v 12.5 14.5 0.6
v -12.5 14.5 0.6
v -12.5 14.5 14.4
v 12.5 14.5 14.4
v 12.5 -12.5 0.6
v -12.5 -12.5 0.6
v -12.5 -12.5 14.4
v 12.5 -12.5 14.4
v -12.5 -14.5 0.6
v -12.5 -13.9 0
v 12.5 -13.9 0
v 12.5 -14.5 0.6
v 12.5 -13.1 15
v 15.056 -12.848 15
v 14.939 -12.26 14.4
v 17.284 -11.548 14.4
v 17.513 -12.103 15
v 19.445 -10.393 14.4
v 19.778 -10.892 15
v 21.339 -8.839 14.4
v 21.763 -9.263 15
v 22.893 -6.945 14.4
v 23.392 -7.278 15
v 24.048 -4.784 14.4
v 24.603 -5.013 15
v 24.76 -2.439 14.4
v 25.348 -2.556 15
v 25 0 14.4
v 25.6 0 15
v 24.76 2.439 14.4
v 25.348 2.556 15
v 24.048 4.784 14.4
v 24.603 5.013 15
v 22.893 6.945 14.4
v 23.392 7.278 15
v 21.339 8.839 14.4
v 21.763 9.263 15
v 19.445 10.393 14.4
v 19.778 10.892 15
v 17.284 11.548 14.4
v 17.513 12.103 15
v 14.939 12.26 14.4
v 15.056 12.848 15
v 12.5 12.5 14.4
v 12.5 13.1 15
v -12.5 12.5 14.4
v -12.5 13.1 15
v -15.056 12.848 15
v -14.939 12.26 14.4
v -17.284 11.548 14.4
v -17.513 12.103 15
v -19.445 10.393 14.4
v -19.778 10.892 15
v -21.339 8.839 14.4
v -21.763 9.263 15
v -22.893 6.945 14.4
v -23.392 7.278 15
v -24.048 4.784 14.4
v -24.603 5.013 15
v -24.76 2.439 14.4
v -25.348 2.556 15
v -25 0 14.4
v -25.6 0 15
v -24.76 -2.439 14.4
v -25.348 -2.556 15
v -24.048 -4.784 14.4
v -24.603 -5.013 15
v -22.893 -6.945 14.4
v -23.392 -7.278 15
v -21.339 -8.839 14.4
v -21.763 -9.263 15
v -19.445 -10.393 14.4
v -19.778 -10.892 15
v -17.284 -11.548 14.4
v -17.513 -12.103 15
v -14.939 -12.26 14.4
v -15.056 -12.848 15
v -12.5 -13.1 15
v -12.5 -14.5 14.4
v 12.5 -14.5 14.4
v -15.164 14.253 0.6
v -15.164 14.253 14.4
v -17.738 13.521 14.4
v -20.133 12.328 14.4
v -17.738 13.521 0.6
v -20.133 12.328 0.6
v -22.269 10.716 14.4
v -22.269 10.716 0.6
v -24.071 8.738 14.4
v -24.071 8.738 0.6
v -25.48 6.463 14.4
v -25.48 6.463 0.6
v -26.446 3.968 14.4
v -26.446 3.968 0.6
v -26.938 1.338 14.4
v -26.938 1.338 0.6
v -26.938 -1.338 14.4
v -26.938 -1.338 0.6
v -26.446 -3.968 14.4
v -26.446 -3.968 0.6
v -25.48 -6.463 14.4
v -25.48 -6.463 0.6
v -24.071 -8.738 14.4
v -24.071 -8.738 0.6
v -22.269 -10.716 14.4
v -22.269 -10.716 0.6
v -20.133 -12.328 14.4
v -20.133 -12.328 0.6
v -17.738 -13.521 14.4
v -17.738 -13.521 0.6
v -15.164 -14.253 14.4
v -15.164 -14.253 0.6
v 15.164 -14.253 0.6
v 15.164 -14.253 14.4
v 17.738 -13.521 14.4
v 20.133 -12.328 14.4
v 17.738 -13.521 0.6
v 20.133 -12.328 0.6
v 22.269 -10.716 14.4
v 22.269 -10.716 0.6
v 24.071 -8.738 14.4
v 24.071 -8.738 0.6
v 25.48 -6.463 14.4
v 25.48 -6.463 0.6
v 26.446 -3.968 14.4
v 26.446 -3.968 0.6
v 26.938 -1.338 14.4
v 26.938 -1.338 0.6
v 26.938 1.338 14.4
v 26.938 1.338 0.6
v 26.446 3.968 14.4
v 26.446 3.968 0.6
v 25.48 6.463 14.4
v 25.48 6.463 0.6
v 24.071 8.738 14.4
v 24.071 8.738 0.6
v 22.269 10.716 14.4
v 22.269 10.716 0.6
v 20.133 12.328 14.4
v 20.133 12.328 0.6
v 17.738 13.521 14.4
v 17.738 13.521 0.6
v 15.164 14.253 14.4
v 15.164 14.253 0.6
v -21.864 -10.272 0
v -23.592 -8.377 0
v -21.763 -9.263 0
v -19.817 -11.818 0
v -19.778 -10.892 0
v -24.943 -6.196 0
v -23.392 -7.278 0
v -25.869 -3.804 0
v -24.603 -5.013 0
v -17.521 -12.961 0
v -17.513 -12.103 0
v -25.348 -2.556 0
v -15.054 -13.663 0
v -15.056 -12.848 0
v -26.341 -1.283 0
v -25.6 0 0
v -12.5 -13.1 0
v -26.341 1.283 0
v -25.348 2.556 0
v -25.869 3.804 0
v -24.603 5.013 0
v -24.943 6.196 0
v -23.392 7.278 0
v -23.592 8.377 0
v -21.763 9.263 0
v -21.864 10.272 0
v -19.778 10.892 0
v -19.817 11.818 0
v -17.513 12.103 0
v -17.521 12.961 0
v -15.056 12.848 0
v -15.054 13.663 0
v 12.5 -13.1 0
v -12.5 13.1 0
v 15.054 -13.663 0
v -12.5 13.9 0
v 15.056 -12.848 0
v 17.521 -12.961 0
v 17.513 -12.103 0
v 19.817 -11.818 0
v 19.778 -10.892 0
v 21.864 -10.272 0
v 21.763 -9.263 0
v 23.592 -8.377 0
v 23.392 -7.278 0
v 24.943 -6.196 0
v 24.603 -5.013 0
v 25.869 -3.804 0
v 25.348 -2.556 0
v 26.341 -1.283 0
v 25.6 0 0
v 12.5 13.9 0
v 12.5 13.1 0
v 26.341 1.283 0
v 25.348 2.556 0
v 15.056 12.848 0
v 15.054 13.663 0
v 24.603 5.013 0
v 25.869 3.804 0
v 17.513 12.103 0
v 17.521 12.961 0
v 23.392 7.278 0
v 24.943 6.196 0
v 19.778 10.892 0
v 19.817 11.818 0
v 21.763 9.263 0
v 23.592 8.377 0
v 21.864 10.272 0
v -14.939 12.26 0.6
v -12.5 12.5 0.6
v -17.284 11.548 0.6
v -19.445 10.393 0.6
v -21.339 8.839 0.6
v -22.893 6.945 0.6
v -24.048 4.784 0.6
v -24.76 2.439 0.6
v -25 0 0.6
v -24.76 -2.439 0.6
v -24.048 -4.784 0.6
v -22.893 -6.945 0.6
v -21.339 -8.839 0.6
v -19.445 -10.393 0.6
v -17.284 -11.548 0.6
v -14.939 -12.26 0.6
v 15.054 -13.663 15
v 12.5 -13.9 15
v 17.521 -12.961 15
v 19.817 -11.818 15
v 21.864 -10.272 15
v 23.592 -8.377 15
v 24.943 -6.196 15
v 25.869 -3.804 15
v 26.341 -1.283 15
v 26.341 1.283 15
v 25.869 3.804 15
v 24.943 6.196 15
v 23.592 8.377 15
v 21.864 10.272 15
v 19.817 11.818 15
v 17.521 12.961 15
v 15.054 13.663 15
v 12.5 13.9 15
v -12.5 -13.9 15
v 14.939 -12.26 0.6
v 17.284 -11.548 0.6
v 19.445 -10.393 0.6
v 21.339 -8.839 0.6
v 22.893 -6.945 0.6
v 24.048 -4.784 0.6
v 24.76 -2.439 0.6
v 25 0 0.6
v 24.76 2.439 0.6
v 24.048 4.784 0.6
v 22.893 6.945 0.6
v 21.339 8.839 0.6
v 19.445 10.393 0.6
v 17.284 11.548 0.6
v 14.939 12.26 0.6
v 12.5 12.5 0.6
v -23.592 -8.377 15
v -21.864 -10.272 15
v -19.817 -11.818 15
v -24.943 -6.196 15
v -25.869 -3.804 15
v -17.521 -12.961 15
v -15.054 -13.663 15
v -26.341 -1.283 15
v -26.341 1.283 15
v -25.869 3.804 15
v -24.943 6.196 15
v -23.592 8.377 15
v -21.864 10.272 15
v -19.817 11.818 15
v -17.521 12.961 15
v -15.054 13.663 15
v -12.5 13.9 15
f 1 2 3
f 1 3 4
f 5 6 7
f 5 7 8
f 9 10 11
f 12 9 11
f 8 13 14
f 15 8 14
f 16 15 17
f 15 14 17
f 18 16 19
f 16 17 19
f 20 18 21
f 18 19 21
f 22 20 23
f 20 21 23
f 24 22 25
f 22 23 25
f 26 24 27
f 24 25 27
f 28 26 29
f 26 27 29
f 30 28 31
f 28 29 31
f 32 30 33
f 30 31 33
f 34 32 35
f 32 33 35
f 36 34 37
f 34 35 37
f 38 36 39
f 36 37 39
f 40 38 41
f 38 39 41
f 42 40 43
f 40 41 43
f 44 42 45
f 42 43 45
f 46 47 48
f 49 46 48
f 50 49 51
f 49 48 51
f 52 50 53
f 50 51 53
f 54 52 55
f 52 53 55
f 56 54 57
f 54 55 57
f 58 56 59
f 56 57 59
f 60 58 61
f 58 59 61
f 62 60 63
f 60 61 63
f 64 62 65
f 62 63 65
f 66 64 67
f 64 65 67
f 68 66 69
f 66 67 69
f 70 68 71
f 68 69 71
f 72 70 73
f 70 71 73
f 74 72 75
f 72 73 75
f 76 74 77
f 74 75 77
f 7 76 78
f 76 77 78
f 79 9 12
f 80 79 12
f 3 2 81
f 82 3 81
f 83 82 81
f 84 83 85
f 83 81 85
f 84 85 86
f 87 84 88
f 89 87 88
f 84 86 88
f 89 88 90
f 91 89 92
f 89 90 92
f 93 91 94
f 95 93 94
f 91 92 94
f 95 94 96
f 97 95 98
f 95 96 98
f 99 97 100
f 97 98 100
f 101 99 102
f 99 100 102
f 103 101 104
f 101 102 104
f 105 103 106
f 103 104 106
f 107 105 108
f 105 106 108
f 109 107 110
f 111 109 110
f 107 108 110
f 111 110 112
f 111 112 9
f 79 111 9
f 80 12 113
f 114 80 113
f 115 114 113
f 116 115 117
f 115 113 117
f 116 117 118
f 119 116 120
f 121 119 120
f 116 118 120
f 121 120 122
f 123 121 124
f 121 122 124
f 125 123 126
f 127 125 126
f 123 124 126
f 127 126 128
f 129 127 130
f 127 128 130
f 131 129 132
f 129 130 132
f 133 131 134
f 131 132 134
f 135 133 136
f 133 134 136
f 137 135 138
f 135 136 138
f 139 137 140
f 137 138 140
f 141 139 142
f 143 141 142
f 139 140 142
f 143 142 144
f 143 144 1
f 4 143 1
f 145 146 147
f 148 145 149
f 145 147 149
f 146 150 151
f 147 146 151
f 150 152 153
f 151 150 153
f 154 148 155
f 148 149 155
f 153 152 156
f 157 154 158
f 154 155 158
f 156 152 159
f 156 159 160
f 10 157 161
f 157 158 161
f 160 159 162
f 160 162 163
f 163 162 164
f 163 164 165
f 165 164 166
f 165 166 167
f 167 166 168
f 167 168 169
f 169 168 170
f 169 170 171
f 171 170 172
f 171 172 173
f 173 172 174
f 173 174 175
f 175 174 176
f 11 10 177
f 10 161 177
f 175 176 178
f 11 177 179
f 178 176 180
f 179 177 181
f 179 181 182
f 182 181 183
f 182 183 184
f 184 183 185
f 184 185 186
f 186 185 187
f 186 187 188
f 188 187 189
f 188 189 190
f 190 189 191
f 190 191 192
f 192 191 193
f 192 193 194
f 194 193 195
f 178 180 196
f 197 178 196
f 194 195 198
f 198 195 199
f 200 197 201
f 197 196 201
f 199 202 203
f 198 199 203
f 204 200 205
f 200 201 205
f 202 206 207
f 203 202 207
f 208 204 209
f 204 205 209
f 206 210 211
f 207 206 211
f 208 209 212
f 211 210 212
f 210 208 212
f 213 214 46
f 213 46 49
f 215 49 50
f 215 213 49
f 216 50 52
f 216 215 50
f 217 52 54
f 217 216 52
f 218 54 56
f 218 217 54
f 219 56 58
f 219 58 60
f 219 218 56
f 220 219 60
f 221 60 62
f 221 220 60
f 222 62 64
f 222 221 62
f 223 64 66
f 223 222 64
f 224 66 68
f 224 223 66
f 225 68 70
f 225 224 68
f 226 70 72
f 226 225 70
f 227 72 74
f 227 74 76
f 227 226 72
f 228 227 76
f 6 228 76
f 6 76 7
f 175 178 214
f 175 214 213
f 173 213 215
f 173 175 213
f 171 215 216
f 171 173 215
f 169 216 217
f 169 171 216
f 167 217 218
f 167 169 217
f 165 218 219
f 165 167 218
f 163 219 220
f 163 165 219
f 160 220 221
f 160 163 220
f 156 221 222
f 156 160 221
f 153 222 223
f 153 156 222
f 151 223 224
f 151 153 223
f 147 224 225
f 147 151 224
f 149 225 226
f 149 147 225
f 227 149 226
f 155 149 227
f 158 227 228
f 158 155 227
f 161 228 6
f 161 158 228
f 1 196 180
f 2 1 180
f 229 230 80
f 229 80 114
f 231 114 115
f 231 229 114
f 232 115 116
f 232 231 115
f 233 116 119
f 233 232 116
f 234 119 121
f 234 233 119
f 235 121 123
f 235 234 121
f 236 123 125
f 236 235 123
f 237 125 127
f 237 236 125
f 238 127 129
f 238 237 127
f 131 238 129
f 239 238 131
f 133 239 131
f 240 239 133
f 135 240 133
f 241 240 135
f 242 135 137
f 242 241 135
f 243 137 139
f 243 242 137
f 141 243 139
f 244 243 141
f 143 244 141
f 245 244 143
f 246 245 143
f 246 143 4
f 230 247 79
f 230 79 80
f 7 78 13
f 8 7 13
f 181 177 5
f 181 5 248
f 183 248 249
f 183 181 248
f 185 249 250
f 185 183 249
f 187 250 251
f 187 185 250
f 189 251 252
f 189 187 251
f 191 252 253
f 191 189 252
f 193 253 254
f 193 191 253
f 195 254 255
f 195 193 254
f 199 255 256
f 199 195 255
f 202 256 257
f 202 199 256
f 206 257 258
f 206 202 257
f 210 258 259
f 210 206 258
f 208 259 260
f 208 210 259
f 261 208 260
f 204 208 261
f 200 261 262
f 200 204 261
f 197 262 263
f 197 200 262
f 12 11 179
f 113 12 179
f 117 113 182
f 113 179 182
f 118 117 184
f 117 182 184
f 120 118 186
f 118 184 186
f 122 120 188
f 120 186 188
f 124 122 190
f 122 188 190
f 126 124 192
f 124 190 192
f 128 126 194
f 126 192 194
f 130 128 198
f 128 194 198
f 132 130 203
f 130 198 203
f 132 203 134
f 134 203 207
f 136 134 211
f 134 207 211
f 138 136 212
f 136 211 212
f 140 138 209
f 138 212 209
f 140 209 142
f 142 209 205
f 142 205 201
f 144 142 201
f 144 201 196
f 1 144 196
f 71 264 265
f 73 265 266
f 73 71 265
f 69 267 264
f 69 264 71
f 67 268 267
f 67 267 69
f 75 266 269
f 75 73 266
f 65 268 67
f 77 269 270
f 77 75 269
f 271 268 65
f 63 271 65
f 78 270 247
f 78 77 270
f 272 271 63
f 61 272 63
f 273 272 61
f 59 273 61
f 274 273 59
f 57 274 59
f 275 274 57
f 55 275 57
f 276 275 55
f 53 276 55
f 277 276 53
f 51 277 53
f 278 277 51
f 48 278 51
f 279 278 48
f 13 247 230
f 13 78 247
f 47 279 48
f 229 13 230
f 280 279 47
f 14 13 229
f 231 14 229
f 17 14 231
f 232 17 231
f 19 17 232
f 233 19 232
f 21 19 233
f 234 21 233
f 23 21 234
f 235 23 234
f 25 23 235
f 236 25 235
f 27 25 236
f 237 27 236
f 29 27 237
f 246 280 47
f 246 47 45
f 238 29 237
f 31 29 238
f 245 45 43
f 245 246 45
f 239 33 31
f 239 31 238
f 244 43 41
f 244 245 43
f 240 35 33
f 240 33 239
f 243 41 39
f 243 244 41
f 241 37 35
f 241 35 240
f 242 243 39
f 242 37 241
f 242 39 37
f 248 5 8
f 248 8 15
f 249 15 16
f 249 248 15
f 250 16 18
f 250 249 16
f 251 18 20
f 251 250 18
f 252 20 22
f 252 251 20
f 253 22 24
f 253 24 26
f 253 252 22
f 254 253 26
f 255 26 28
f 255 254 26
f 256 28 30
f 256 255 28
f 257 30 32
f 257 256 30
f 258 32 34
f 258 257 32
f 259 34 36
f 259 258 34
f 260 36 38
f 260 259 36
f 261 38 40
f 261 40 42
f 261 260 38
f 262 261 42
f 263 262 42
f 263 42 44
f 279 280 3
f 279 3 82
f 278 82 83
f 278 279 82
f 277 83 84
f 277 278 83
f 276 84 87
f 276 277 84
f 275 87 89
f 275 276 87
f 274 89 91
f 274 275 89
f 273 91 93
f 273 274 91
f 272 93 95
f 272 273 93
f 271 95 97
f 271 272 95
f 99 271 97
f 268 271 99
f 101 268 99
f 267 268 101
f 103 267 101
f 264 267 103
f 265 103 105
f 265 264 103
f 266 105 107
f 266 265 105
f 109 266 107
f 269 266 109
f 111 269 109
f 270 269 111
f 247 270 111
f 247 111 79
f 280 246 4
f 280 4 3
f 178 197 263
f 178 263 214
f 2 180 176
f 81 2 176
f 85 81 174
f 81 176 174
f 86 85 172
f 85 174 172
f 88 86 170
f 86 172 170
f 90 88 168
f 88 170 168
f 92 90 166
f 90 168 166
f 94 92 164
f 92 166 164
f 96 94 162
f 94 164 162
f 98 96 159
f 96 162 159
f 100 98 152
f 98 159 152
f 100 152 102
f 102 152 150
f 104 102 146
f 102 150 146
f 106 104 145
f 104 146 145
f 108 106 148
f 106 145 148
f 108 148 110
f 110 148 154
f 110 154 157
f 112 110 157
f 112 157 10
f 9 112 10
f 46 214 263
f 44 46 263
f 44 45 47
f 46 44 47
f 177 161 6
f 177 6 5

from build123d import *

# Parameters (mm, degrees)
PAD_DEPTH    = 15
CHAMFER_SIZE = 0.6


with BuildPart() as part:
    # Sketch002 → Pad (new body)
    with BuildSketch(Plane.XY):
        with BuildLine():
            ThreePointArc((-12.5, 14.5), (-27, 0), (-12.5, -14.5))
            Line((-12.5, -14.5), (12.5, -14.5))
            ThreePointArc((12.5, -14.5), (27, 0), (12.5, 14.5))
            Line((-12.5, 14.5), (12.5, 14.5))
        make_face()
        with BuildLine():
            ThreePointArc((-12.5, 12.5), (-25, 0), (-12.5, -12.5))
            Line((-12.5, -12.5), (12.5, -12.5))
            ThreePointArc((12.5, -12.5), (25, 0), (12.5, 12.5))
            Line((-12.5, 12.5), (12.5, 12.5))
        make_face(mode=Mode.SUBTRACT)
    extrude(amount=PAD_DEPTH)

    # Chamfer
    chamfer_edges = [part.edges().sort_by_distance(p)[0] for p in [
        (-27, 0, 15),
        (0, -14.5, 15),
        (27, 0, 15),
        (0, 14.5, 15),
        (-25, 0, 15),
        (0, -12.5, 15),
        (25, 0, 15),
        (0, 12.5, 15),
        (-27, 0, 0),
        (0, -14.5, 0),
        (27, 0, 0),
        (0, 14.5, 0),
        (-25, 0, 0),
        (0, -12.5, 0),
        (25, 0, 0),
        (0, 12.5, 0),
    ]]
    chamfer(chamfer_edges, length=CHAMFER_SIZE)


solid = part.part
